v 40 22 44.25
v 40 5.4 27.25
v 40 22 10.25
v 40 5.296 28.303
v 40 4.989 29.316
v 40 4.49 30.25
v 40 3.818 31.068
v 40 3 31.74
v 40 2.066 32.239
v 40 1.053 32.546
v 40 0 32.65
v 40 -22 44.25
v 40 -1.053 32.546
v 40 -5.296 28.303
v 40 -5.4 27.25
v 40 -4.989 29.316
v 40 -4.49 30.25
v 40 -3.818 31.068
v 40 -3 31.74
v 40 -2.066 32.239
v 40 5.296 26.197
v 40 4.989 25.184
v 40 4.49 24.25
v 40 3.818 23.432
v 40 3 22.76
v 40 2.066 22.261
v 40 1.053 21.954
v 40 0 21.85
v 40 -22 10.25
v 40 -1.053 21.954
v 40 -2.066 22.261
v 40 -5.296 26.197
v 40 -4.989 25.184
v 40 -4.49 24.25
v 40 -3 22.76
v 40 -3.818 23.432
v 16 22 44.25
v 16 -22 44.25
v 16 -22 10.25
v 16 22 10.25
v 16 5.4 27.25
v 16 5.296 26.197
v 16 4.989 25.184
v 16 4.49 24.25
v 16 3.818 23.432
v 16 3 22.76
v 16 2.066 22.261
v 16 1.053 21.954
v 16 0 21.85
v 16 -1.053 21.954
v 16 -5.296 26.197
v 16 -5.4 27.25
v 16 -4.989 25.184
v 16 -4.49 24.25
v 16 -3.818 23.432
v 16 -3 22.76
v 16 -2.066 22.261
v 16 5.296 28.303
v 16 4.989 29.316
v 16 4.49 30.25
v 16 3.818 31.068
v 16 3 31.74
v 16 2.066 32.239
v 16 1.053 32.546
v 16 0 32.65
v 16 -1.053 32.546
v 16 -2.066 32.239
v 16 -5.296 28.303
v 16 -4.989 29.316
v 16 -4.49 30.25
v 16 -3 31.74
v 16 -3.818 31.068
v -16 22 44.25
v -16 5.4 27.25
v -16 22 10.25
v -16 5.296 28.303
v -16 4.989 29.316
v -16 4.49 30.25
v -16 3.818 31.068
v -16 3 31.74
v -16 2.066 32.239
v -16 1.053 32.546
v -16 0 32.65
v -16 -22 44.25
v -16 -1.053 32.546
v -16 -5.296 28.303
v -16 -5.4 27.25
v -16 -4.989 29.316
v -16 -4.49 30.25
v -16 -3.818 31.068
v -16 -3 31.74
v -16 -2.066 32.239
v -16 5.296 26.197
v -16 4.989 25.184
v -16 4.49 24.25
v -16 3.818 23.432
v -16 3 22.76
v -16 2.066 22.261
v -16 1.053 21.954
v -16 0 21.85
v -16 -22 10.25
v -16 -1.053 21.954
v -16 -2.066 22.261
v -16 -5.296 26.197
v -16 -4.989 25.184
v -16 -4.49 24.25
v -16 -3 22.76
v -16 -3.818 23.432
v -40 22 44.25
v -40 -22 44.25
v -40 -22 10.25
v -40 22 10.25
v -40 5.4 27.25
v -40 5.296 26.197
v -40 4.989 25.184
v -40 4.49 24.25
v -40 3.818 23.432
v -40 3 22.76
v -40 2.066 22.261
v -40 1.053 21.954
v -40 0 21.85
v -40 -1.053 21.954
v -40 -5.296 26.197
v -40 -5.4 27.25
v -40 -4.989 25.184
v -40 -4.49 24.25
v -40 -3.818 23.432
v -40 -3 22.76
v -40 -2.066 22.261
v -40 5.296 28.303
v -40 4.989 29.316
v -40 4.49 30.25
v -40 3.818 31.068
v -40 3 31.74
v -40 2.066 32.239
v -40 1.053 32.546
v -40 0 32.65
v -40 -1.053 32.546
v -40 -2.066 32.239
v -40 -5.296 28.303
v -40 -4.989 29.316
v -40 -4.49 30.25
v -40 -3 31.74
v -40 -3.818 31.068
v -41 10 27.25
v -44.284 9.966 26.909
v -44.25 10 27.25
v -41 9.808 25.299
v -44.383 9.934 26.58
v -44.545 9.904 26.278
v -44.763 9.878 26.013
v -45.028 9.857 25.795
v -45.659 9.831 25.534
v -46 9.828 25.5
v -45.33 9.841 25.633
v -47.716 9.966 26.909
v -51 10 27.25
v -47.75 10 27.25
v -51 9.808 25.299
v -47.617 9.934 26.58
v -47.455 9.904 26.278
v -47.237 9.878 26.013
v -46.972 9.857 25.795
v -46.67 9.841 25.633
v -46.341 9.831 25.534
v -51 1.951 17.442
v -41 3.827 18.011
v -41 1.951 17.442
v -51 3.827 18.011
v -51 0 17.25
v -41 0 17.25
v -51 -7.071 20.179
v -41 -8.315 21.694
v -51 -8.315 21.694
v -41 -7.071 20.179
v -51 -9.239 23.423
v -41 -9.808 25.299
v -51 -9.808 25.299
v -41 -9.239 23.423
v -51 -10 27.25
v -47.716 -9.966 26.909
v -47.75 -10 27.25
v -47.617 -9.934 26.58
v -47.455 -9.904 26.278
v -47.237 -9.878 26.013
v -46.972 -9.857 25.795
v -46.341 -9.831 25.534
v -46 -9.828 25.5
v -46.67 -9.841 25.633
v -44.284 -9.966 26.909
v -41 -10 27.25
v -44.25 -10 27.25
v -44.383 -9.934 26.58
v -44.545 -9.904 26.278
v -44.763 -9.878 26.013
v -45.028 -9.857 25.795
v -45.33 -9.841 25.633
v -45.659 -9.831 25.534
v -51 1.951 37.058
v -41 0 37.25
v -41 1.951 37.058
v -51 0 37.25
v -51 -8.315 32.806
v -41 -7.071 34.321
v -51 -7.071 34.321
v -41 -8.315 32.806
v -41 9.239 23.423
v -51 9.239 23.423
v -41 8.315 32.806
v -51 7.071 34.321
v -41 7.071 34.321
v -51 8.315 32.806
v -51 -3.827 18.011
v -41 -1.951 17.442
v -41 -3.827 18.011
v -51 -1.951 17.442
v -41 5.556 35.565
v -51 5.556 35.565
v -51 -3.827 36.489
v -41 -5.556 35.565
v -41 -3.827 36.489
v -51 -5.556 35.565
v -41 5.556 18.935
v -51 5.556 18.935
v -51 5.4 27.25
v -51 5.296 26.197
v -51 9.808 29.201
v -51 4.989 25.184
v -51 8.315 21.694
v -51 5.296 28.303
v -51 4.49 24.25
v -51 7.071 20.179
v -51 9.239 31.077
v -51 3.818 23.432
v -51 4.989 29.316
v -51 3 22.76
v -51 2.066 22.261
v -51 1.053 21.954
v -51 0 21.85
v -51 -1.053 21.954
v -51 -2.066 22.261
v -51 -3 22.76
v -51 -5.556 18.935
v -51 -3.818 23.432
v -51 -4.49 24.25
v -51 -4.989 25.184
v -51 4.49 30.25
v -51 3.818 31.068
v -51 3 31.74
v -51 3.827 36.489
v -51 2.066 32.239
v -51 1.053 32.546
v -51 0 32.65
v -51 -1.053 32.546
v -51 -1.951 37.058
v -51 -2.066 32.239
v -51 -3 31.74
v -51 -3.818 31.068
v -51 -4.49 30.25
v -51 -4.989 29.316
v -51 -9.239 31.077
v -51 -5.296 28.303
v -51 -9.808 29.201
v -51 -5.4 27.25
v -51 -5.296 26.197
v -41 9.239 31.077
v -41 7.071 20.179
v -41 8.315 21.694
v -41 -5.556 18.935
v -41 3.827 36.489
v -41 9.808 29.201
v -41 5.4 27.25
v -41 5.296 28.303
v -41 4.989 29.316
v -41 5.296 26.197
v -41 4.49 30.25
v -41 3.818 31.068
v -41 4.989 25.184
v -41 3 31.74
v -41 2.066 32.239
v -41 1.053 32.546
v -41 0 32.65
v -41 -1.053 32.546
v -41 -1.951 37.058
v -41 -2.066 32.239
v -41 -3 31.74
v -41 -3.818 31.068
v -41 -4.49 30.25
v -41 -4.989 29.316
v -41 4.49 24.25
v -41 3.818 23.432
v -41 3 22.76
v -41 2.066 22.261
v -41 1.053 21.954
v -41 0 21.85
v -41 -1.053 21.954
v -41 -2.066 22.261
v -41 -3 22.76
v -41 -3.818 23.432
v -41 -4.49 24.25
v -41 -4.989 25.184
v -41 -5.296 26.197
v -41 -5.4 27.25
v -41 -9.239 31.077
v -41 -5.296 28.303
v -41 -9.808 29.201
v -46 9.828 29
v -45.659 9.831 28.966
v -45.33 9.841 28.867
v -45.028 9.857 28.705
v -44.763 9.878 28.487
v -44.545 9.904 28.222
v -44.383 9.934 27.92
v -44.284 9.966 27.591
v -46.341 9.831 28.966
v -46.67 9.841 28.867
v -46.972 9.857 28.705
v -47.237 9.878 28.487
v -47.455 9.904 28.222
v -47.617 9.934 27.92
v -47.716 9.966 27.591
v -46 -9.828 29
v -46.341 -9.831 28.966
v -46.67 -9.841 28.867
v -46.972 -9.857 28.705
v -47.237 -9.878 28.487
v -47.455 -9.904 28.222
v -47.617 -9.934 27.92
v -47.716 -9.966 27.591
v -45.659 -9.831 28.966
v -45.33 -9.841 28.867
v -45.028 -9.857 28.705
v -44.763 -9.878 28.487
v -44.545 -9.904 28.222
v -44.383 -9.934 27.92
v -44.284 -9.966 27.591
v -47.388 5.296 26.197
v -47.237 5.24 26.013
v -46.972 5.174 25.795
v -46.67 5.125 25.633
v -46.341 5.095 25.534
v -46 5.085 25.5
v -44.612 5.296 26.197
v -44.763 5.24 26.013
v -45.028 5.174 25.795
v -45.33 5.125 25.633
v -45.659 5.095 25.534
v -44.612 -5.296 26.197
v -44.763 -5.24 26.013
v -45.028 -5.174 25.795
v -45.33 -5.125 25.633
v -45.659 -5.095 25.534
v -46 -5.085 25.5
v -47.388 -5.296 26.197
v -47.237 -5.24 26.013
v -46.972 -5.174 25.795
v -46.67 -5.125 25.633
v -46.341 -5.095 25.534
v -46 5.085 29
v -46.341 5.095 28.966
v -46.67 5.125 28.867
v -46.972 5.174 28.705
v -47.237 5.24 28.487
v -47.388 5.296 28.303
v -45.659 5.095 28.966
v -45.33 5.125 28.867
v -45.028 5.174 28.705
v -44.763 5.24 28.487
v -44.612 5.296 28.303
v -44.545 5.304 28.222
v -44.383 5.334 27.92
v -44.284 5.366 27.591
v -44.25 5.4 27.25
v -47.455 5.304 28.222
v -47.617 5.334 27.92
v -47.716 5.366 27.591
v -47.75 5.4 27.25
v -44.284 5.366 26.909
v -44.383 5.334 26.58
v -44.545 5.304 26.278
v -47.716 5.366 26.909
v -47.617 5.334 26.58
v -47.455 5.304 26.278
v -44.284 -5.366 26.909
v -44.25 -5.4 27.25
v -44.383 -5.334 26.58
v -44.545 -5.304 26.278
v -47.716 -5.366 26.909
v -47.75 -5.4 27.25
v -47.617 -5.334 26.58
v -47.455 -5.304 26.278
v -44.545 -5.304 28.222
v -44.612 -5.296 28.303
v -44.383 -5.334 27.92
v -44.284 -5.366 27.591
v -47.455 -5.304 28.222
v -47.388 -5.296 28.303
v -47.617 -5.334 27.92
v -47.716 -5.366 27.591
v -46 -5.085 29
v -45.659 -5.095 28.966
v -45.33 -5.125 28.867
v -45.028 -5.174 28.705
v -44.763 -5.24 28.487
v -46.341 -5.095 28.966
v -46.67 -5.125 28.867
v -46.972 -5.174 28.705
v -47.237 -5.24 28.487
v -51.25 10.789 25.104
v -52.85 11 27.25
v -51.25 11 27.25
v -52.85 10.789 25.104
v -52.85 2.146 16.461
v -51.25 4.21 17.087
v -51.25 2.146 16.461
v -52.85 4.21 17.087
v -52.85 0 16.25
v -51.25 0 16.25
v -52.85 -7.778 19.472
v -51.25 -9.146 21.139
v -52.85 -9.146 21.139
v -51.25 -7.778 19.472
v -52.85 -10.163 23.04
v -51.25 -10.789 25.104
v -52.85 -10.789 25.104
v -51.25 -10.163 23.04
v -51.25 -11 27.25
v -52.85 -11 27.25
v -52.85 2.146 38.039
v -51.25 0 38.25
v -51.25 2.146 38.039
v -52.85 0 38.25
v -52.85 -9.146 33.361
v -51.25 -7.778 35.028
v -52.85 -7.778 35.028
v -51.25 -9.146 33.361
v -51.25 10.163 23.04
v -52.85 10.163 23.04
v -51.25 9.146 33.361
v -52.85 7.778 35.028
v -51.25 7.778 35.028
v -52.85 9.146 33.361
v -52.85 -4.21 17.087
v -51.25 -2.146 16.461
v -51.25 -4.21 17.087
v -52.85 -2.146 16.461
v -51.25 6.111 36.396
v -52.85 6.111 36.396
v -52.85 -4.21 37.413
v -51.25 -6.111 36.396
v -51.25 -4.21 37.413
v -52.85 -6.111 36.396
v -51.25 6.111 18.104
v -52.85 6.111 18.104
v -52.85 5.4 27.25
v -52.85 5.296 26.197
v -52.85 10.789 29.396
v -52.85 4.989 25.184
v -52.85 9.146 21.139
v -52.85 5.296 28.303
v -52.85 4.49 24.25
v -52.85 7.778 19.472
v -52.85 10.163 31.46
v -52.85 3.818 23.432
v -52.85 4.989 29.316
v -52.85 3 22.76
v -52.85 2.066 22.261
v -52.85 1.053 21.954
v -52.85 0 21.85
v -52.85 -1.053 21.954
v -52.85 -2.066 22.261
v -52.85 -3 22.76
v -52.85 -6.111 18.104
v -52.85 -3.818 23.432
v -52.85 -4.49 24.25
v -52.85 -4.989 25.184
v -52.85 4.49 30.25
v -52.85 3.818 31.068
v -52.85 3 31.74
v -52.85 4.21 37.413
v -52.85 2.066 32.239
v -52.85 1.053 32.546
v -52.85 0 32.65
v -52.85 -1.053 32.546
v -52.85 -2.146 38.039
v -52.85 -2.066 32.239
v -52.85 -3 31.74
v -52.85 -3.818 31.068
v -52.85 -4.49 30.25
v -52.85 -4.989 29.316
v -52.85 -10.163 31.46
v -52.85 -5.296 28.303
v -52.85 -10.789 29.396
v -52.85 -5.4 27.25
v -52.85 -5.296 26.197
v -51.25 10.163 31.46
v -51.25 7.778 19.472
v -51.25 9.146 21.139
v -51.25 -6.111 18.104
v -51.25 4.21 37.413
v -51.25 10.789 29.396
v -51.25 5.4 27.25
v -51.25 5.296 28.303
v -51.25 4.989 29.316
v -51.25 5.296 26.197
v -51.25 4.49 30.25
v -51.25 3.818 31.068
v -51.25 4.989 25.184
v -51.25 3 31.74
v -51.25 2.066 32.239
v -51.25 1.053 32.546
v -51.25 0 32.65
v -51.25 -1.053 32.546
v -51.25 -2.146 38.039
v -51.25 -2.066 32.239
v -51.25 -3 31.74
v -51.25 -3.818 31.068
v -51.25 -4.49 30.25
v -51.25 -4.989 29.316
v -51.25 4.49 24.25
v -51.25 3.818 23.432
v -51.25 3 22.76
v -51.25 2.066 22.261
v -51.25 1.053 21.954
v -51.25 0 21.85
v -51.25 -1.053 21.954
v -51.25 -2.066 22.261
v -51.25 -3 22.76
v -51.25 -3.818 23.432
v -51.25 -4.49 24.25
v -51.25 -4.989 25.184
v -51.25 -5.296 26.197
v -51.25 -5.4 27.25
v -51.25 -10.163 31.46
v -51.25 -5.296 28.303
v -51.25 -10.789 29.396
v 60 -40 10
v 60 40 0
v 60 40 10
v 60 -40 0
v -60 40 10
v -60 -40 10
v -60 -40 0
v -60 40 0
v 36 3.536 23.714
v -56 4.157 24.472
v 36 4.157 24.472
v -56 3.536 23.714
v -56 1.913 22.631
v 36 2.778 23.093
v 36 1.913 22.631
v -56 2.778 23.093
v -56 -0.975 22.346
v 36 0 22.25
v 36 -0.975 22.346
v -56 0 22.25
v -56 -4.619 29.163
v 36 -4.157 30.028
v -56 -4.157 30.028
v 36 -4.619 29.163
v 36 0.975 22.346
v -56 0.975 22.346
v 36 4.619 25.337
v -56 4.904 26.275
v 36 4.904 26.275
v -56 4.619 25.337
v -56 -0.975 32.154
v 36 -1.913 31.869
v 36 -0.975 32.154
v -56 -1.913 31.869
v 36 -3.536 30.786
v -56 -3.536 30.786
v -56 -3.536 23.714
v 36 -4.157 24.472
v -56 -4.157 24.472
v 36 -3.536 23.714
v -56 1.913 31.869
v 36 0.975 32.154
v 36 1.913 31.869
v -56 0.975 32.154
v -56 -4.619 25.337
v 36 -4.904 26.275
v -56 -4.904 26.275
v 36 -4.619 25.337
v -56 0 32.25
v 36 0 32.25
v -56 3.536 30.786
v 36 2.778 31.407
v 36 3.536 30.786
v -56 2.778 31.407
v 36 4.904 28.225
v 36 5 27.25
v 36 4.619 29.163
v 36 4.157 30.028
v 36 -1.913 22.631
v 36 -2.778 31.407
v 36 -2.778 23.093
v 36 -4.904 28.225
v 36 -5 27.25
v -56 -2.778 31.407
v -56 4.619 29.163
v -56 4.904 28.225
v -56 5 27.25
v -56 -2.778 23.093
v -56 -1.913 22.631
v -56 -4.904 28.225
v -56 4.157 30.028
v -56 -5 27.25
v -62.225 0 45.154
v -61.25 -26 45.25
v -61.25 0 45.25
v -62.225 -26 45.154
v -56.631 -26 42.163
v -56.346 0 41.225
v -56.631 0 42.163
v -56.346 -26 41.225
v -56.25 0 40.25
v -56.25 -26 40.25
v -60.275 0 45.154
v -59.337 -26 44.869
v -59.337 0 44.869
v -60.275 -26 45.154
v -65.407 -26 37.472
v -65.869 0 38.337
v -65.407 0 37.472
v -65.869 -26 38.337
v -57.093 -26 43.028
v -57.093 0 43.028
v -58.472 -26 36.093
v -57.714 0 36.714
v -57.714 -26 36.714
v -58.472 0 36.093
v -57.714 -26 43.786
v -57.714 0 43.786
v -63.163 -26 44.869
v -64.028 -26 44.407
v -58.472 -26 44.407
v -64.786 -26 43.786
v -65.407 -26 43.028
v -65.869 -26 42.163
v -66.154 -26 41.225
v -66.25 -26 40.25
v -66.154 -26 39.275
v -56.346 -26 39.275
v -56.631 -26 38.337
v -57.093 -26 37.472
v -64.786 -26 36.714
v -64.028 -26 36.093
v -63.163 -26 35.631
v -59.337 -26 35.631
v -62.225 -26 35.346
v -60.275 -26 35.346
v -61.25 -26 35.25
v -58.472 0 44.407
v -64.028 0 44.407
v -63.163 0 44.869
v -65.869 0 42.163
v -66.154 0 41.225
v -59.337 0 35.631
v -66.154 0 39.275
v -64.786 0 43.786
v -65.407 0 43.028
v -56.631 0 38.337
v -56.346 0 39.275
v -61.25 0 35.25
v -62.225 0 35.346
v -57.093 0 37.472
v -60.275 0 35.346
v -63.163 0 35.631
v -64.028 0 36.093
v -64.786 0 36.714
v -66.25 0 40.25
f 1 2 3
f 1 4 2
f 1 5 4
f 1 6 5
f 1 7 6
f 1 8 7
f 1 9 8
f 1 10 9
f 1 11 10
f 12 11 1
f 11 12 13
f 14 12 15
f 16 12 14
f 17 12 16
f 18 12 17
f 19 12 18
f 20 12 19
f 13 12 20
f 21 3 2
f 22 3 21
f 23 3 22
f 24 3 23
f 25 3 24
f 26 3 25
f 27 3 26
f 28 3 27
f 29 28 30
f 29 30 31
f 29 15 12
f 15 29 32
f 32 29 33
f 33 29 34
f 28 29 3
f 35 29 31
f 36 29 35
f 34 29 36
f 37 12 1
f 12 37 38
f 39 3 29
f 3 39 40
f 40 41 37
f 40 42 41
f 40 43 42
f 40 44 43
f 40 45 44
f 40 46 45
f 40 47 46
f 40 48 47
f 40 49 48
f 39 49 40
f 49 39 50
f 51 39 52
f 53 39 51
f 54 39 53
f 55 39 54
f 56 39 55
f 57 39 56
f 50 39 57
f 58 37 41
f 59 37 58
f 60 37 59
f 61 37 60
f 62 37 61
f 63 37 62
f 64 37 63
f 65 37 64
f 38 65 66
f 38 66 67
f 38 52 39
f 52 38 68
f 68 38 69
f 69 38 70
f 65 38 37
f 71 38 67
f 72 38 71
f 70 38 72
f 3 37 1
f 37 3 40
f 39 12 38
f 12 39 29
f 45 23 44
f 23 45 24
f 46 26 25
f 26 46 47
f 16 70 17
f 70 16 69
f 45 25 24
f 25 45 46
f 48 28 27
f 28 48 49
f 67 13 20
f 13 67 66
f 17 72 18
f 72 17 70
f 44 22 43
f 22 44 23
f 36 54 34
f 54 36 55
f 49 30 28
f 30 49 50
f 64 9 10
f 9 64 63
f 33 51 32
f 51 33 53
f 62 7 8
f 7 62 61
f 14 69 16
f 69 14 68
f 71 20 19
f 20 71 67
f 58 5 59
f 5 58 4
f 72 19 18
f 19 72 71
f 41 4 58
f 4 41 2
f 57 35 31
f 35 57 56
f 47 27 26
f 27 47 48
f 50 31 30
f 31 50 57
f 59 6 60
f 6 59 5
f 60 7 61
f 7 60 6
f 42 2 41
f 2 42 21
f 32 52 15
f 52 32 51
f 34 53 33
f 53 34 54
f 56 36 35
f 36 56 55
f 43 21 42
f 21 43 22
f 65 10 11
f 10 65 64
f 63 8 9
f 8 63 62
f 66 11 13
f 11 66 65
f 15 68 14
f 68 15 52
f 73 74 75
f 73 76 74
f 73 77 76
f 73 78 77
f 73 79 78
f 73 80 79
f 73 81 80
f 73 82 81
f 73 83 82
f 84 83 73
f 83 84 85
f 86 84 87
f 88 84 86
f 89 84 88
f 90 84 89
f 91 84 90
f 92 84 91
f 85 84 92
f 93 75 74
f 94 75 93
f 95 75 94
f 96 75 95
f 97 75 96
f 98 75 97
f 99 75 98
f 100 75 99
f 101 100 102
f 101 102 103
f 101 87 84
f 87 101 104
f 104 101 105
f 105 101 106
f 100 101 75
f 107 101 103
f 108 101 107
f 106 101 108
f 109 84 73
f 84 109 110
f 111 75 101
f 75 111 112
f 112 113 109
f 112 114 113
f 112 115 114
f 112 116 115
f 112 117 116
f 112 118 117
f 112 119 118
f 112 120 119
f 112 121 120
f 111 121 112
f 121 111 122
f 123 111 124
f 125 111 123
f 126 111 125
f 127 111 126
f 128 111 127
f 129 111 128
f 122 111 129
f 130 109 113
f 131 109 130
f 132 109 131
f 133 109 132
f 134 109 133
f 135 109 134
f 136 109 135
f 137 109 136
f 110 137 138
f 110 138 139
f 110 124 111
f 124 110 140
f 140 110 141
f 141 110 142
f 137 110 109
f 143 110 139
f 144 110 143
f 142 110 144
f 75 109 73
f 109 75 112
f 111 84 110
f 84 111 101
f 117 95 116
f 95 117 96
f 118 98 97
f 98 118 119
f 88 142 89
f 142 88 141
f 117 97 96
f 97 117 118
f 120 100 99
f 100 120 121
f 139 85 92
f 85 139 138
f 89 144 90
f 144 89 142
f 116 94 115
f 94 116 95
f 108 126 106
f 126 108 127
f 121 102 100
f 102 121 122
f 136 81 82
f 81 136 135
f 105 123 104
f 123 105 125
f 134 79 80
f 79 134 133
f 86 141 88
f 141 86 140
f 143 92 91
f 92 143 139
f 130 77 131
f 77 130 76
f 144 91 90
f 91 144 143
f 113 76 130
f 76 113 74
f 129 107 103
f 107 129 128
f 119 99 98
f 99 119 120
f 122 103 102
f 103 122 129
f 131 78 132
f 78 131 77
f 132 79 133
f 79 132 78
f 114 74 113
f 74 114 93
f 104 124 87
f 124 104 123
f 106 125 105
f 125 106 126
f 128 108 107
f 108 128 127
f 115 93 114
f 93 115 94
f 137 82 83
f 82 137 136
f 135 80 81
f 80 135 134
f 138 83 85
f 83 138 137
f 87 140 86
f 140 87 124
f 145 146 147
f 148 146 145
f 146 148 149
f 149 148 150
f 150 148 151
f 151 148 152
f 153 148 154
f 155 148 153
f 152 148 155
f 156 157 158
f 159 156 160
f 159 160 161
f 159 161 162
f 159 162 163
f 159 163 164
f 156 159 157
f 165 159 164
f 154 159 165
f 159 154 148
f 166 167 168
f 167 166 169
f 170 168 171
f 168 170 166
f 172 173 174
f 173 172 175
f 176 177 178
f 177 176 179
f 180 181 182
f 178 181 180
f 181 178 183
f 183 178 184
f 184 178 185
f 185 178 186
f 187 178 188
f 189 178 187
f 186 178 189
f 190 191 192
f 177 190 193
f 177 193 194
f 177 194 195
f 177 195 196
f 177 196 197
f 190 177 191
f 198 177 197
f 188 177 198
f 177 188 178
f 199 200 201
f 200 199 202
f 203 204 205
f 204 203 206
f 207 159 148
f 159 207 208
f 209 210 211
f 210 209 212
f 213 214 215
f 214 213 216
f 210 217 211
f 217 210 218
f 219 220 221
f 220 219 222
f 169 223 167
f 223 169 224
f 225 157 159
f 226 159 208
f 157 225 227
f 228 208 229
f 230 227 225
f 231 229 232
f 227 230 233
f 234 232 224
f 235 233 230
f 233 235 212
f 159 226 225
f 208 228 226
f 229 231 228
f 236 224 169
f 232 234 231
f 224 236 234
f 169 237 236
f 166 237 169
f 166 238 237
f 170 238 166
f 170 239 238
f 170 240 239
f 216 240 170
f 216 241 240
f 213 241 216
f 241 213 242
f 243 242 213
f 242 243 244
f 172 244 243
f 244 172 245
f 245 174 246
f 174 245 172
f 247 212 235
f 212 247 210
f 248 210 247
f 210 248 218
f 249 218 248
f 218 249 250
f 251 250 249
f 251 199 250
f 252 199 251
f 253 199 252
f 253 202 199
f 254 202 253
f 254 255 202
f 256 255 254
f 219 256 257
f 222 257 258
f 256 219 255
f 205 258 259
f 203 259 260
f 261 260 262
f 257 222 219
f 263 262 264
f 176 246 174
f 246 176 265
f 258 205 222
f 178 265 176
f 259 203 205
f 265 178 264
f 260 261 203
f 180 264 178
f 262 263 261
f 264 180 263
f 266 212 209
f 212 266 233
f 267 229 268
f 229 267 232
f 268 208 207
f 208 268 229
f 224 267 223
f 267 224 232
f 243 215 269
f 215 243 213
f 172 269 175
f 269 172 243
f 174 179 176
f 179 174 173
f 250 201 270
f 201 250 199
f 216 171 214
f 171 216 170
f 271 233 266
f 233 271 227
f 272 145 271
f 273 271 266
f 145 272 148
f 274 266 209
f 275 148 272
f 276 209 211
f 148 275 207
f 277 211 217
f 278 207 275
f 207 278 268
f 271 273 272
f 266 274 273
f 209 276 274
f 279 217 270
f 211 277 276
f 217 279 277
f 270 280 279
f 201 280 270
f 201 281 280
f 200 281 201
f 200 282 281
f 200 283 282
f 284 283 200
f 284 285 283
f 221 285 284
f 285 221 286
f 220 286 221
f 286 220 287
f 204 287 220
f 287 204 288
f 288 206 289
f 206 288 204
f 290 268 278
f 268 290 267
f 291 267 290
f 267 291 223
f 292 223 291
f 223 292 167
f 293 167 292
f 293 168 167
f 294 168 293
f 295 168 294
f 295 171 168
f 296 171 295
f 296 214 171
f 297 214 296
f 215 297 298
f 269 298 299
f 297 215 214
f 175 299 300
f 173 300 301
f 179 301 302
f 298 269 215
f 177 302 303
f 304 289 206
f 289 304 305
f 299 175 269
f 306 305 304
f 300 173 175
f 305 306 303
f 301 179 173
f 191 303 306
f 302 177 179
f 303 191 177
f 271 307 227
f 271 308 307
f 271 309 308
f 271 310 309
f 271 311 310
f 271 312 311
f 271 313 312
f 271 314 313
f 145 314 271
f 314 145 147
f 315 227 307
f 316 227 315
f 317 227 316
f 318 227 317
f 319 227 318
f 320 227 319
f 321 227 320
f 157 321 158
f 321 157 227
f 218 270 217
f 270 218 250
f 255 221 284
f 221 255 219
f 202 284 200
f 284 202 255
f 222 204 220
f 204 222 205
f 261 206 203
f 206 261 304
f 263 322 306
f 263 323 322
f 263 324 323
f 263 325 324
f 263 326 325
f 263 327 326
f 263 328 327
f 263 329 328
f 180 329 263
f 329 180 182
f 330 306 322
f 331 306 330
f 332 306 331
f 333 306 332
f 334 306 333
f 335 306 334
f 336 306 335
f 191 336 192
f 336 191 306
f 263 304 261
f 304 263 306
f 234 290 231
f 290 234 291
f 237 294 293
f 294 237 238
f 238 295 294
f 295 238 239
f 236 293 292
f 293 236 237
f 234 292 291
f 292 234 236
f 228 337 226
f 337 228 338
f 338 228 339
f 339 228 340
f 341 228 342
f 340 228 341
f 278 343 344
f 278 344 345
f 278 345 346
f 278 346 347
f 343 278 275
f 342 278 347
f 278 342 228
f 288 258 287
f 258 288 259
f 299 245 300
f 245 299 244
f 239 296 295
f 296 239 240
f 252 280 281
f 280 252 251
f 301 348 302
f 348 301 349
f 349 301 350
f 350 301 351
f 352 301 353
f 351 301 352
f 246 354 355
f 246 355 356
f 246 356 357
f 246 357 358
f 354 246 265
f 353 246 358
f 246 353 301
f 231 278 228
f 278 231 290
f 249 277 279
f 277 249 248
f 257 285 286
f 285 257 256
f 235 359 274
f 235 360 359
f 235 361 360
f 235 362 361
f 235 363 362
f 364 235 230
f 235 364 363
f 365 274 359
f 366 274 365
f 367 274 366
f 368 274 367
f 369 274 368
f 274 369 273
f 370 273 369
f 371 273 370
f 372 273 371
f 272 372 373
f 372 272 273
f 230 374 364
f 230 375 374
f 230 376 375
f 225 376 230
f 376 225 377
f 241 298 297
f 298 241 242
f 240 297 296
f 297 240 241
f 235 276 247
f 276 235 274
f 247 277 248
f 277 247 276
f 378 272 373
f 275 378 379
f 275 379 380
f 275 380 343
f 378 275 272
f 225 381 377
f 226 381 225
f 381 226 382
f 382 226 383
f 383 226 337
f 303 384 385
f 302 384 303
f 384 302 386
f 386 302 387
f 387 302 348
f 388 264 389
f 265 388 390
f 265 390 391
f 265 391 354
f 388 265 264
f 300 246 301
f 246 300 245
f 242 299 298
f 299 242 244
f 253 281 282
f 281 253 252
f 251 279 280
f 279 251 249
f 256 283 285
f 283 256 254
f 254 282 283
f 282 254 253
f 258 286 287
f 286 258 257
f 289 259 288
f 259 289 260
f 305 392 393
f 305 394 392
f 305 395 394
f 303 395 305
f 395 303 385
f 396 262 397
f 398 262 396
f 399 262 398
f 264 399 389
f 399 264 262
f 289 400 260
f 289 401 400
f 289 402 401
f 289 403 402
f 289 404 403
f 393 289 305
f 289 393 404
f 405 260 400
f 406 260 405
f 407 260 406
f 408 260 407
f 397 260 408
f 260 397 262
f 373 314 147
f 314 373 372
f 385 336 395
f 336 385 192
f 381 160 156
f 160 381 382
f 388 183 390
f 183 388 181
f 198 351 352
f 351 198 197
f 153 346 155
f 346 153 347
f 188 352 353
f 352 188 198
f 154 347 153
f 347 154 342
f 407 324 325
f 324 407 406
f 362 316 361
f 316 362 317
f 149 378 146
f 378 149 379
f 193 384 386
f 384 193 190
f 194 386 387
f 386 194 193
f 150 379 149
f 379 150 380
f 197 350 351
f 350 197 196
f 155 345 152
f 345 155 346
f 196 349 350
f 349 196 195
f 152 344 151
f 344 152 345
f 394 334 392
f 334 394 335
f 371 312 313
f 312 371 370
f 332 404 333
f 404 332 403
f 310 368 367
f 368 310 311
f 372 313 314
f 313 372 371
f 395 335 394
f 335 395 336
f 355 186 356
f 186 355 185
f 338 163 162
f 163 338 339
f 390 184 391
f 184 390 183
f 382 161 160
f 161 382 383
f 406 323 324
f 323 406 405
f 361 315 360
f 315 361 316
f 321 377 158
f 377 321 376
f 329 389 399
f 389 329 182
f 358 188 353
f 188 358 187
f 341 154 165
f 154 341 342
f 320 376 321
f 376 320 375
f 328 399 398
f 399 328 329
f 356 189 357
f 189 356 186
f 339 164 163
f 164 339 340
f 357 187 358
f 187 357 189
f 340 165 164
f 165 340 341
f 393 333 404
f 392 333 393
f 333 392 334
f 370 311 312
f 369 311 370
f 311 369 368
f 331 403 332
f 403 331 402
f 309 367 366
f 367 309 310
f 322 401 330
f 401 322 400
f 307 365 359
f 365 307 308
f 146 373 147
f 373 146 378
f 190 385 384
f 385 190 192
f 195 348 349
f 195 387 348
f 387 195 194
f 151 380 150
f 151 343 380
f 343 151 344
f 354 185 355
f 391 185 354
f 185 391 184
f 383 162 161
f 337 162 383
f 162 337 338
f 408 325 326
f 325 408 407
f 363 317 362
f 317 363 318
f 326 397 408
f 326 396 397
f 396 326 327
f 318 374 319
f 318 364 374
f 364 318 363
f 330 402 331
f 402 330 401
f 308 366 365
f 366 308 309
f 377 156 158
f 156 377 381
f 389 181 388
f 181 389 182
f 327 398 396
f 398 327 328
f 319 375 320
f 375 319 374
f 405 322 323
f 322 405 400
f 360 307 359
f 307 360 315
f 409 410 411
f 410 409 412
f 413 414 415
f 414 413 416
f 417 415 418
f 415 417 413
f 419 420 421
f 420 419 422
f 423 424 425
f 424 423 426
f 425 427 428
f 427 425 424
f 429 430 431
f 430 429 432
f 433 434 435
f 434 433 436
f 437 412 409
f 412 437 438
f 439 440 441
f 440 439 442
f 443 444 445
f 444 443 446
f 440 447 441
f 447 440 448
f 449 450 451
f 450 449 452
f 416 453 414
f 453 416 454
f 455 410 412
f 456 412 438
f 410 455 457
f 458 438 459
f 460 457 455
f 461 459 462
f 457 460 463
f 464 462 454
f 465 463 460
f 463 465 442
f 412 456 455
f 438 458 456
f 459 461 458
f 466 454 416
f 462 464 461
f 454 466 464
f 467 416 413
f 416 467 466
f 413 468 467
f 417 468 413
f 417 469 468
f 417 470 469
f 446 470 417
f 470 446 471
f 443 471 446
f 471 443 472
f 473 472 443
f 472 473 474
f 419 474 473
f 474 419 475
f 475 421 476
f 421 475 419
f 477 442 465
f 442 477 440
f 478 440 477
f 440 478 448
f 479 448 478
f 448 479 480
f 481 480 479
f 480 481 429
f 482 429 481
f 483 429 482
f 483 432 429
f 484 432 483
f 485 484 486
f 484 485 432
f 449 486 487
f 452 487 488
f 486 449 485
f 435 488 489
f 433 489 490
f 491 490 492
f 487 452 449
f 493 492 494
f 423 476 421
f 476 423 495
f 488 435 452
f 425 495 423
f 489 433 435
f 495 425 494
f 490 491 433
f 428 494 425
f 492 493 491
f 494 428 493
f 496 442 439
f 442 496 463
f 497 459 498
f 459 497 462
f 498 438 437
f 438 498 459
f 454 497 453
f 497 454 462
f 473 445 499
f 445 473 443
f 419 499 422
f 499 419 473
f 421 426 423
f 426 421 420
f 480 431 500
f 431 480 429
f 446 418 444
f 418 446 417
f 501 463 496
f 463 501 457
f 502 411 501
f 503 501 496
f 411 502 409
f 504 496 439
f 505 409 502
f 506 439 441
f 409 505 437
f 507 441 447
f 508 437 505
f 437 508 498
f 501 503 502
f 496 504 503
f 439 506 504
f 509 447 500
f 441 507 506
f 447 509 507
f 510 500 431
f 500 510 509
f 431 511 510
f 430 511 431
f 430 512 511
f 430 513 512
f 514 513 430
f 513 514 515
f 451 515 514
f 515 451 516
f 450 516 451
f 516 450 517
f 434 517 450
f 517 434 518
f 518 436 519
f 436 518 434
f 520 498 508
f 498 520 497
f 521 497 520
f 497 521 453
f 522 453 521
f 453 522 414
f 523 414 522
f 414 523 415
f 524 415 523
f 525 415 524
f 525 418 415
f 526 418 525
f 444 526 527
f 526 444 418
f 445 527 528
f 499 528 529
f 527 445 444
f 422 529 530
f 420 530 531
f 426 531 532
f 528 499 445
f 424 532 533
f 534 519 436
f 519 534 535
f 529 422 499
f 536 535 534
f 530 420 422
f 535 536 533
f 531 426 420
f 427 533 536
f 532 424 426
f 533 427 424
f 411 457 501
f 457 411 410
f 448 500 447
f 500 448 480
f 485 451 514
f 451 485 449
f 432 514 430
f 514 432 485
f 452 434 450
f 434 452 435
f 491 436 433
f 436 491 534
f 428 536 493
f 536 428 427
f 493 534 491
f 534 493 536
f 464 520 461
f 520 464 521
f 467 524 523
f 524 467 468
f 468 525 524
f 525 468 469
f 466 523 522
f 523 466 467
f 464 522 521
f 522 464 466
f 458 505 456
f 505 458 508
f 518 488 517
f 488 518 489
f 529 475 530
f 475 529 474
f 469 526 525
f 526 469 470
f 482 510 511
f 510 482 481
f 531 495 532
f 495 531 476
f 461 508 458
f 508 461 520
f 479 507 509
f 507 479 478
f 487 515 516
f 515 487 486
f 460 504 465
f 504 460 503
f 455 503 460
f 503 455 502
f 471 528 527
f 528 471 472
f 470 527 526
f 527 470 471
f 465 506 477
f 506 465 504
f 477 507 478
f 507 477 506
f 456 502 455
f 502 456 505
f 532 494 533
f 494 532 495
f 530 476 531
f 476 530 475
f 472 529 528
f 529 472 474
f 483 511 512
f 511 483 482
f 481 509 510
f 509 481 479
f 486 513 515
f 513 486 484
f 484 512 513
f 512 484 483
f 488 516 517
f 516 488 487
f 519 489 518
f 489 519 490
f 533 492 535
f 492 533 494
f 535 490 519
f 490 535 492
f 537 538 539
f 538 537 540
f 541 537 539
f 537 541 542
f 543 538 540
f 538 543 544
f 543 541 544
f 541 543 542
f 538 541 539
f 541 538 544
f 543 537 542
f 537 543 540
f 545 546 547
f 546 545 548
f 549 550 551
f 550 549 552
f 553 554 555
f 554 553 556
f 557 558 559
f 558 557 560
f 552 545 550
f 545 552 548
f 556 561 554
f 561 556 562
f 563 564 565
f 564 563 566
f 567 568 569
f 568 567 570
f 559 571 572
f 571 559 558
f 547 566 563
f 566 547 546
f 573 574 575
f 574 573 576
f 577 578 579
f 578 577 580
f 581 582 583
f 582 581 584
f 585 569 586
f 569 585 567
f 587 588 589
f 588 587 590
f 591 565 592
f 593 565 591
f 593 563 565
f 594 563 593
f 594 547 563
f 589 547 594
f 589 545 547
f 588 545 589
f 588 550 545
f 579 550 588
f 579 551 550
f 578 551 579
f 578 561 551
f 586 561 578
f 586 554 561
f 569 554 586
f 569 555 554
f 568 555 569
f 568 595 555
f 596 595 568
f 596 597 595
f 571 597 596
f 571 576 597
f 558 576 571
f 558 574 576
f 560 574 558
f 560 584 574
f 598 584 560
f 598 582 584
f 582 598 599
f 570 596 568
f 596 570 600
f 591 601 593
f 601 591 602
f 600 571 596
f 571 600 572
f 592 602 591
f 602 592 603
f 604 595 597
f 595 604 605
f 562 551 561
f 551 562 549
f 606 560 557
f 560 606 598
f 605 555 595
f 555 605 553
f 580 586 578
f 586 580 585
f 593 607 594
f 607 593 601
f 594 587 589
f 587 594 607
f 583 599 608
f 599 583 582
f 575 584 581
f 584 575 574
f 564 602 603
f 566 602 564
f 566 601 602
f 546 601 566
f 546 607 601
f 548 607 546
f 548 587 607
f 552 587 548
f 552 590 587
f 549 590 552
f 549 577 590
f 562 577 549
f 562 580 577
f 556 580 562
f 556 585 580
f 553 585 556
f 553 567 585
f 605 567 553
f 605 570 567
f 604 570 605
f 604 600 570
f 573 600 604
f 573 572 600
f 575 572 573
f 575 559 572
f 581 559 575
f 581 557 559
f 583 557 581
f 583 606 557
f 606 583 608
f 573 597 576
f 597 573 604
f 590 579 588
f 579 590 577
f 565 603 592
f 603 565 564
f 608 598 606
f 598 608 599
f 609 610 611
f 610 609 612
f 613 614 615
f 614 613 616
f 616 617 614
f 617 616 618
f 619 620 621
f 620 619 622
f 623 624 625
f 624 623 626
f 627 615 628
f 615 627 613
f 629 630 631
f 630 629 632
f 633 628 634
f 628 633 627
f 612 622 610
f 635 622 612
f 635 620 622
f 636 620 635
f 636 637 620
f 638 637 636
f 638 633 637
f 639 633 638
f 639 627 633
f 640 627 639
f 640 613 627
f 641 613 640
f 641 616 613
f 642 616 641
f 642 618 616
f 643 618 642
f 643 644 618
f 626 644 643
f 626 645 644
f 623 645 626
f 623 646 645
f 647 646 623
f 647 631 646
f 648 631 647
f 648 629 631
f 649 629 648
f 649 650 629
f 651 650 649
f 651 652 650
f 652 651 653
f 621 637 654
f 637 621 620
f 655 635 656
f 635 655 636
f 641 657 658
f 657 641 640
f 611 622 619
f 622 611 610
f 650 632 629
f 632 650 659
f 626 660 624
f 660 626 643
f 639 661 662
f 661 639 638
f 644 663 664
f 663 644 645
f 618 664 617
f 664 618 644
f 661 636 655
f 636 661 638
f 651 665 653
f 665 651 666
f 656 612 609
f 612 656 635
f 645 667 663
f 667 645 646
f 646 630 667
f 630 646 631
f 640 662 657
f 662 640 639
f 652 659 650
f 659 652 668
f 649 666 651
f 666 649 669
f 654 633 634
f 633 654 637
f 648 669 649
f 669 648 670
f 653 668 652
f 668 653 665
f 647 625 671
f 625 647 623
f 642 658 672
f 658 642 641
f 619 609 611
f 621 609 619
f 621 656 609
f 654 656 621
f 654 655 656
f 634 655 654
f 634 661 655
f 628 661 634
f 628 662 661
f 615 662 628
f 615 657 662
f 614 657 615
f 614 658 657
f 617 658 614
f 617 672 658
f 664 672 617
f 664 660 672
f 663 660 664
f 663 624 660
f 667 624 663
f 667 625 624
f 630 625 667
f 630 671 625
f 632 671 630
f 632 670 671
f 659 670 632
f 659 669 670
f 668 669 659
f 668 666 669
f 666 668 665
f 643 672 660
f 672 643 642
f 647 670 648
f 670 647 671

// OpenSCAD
$fn = 32;

// ------------------------------------------------------------------------
// Machine vise: screw d10, jaws 24 x 34 mm
// Every part is its own module, assembly() places every instance.
// ------------------------------------------------------------------------

// --- part 1 ---
module vise_bed() {
  difference() {
    translate([-60, -40, 0]) cube([120, 80, 10]);
  }
}

// --- part 2 ---
module vise_jaw() {
  difference() {
    translate([-12, -22, 0]) cube([24, 44, 34]);
    translate([0, 0, 17]) rotate([0, 90, 0]) cylinder(h = 26, d = 10.8, center = true);
  }
}

// --- part 3 ---
module vise_screw() {
  translate([0, 0, -46]) cylinder(h = 92, d = 10);
}

// --- part 4 ---
module screw_collar() {
  difference() {
    cylinder(h = 10, d = 20);
    translate([0, 0, -1]) cylinder(h = 12, d = 10.8);
    translate([0, 0, 5]) rotate([90, 0, 0]) cylinder(h = 22, d = 3.5, center = true);
  }
}

// --- part 5 ---
module screw_washer() {
  difference() {
      translate([0, 0, 0]) cylinder(h = 1.6, d = 22);
      translate([0, 0, -1]) cylinder(h = 3.6, d = 10.8);
    }
}

// --- part 6 ---
module vise_handle() {
  cylinder(h = 26, d = 10);
}

// --- assembly ---
module assembly() {
  color([0.80, 0.24, 0.20]) translate([0, 0, 0]) rotate([0, 0, 0]) vise_bed();
  color([0.20, 0.45, 0.75]) translate([28, 0, 10.25]) rotate([0, 0, 0]) vise_jaw();
  color([0.25, 0.62, 0.32]) translate([-28, 0, 10.25]) rotate([0, 0, 0]) vise_jaw();
  color([0.92, 0.70, 0.18]) translate([-10, 0, 27.25]) rotate([0, 90, 0]) vise_screw();
  color([0.58, 0.35, 0.70]) translate([-51, 0, 27.25]) rotate([0, 90, 0]) screw_collar();
  color([0.16, 0.66, 0.66]) translate([-52.85, 0, 27.25]) rotate([0, 90, 0]) screw_washer();
  color([0.85, 0.48, 0.18]) translate([-61.25, 0, 40.25]) rotate([90, 0, 0]) vise_handle();
}

assembly();
